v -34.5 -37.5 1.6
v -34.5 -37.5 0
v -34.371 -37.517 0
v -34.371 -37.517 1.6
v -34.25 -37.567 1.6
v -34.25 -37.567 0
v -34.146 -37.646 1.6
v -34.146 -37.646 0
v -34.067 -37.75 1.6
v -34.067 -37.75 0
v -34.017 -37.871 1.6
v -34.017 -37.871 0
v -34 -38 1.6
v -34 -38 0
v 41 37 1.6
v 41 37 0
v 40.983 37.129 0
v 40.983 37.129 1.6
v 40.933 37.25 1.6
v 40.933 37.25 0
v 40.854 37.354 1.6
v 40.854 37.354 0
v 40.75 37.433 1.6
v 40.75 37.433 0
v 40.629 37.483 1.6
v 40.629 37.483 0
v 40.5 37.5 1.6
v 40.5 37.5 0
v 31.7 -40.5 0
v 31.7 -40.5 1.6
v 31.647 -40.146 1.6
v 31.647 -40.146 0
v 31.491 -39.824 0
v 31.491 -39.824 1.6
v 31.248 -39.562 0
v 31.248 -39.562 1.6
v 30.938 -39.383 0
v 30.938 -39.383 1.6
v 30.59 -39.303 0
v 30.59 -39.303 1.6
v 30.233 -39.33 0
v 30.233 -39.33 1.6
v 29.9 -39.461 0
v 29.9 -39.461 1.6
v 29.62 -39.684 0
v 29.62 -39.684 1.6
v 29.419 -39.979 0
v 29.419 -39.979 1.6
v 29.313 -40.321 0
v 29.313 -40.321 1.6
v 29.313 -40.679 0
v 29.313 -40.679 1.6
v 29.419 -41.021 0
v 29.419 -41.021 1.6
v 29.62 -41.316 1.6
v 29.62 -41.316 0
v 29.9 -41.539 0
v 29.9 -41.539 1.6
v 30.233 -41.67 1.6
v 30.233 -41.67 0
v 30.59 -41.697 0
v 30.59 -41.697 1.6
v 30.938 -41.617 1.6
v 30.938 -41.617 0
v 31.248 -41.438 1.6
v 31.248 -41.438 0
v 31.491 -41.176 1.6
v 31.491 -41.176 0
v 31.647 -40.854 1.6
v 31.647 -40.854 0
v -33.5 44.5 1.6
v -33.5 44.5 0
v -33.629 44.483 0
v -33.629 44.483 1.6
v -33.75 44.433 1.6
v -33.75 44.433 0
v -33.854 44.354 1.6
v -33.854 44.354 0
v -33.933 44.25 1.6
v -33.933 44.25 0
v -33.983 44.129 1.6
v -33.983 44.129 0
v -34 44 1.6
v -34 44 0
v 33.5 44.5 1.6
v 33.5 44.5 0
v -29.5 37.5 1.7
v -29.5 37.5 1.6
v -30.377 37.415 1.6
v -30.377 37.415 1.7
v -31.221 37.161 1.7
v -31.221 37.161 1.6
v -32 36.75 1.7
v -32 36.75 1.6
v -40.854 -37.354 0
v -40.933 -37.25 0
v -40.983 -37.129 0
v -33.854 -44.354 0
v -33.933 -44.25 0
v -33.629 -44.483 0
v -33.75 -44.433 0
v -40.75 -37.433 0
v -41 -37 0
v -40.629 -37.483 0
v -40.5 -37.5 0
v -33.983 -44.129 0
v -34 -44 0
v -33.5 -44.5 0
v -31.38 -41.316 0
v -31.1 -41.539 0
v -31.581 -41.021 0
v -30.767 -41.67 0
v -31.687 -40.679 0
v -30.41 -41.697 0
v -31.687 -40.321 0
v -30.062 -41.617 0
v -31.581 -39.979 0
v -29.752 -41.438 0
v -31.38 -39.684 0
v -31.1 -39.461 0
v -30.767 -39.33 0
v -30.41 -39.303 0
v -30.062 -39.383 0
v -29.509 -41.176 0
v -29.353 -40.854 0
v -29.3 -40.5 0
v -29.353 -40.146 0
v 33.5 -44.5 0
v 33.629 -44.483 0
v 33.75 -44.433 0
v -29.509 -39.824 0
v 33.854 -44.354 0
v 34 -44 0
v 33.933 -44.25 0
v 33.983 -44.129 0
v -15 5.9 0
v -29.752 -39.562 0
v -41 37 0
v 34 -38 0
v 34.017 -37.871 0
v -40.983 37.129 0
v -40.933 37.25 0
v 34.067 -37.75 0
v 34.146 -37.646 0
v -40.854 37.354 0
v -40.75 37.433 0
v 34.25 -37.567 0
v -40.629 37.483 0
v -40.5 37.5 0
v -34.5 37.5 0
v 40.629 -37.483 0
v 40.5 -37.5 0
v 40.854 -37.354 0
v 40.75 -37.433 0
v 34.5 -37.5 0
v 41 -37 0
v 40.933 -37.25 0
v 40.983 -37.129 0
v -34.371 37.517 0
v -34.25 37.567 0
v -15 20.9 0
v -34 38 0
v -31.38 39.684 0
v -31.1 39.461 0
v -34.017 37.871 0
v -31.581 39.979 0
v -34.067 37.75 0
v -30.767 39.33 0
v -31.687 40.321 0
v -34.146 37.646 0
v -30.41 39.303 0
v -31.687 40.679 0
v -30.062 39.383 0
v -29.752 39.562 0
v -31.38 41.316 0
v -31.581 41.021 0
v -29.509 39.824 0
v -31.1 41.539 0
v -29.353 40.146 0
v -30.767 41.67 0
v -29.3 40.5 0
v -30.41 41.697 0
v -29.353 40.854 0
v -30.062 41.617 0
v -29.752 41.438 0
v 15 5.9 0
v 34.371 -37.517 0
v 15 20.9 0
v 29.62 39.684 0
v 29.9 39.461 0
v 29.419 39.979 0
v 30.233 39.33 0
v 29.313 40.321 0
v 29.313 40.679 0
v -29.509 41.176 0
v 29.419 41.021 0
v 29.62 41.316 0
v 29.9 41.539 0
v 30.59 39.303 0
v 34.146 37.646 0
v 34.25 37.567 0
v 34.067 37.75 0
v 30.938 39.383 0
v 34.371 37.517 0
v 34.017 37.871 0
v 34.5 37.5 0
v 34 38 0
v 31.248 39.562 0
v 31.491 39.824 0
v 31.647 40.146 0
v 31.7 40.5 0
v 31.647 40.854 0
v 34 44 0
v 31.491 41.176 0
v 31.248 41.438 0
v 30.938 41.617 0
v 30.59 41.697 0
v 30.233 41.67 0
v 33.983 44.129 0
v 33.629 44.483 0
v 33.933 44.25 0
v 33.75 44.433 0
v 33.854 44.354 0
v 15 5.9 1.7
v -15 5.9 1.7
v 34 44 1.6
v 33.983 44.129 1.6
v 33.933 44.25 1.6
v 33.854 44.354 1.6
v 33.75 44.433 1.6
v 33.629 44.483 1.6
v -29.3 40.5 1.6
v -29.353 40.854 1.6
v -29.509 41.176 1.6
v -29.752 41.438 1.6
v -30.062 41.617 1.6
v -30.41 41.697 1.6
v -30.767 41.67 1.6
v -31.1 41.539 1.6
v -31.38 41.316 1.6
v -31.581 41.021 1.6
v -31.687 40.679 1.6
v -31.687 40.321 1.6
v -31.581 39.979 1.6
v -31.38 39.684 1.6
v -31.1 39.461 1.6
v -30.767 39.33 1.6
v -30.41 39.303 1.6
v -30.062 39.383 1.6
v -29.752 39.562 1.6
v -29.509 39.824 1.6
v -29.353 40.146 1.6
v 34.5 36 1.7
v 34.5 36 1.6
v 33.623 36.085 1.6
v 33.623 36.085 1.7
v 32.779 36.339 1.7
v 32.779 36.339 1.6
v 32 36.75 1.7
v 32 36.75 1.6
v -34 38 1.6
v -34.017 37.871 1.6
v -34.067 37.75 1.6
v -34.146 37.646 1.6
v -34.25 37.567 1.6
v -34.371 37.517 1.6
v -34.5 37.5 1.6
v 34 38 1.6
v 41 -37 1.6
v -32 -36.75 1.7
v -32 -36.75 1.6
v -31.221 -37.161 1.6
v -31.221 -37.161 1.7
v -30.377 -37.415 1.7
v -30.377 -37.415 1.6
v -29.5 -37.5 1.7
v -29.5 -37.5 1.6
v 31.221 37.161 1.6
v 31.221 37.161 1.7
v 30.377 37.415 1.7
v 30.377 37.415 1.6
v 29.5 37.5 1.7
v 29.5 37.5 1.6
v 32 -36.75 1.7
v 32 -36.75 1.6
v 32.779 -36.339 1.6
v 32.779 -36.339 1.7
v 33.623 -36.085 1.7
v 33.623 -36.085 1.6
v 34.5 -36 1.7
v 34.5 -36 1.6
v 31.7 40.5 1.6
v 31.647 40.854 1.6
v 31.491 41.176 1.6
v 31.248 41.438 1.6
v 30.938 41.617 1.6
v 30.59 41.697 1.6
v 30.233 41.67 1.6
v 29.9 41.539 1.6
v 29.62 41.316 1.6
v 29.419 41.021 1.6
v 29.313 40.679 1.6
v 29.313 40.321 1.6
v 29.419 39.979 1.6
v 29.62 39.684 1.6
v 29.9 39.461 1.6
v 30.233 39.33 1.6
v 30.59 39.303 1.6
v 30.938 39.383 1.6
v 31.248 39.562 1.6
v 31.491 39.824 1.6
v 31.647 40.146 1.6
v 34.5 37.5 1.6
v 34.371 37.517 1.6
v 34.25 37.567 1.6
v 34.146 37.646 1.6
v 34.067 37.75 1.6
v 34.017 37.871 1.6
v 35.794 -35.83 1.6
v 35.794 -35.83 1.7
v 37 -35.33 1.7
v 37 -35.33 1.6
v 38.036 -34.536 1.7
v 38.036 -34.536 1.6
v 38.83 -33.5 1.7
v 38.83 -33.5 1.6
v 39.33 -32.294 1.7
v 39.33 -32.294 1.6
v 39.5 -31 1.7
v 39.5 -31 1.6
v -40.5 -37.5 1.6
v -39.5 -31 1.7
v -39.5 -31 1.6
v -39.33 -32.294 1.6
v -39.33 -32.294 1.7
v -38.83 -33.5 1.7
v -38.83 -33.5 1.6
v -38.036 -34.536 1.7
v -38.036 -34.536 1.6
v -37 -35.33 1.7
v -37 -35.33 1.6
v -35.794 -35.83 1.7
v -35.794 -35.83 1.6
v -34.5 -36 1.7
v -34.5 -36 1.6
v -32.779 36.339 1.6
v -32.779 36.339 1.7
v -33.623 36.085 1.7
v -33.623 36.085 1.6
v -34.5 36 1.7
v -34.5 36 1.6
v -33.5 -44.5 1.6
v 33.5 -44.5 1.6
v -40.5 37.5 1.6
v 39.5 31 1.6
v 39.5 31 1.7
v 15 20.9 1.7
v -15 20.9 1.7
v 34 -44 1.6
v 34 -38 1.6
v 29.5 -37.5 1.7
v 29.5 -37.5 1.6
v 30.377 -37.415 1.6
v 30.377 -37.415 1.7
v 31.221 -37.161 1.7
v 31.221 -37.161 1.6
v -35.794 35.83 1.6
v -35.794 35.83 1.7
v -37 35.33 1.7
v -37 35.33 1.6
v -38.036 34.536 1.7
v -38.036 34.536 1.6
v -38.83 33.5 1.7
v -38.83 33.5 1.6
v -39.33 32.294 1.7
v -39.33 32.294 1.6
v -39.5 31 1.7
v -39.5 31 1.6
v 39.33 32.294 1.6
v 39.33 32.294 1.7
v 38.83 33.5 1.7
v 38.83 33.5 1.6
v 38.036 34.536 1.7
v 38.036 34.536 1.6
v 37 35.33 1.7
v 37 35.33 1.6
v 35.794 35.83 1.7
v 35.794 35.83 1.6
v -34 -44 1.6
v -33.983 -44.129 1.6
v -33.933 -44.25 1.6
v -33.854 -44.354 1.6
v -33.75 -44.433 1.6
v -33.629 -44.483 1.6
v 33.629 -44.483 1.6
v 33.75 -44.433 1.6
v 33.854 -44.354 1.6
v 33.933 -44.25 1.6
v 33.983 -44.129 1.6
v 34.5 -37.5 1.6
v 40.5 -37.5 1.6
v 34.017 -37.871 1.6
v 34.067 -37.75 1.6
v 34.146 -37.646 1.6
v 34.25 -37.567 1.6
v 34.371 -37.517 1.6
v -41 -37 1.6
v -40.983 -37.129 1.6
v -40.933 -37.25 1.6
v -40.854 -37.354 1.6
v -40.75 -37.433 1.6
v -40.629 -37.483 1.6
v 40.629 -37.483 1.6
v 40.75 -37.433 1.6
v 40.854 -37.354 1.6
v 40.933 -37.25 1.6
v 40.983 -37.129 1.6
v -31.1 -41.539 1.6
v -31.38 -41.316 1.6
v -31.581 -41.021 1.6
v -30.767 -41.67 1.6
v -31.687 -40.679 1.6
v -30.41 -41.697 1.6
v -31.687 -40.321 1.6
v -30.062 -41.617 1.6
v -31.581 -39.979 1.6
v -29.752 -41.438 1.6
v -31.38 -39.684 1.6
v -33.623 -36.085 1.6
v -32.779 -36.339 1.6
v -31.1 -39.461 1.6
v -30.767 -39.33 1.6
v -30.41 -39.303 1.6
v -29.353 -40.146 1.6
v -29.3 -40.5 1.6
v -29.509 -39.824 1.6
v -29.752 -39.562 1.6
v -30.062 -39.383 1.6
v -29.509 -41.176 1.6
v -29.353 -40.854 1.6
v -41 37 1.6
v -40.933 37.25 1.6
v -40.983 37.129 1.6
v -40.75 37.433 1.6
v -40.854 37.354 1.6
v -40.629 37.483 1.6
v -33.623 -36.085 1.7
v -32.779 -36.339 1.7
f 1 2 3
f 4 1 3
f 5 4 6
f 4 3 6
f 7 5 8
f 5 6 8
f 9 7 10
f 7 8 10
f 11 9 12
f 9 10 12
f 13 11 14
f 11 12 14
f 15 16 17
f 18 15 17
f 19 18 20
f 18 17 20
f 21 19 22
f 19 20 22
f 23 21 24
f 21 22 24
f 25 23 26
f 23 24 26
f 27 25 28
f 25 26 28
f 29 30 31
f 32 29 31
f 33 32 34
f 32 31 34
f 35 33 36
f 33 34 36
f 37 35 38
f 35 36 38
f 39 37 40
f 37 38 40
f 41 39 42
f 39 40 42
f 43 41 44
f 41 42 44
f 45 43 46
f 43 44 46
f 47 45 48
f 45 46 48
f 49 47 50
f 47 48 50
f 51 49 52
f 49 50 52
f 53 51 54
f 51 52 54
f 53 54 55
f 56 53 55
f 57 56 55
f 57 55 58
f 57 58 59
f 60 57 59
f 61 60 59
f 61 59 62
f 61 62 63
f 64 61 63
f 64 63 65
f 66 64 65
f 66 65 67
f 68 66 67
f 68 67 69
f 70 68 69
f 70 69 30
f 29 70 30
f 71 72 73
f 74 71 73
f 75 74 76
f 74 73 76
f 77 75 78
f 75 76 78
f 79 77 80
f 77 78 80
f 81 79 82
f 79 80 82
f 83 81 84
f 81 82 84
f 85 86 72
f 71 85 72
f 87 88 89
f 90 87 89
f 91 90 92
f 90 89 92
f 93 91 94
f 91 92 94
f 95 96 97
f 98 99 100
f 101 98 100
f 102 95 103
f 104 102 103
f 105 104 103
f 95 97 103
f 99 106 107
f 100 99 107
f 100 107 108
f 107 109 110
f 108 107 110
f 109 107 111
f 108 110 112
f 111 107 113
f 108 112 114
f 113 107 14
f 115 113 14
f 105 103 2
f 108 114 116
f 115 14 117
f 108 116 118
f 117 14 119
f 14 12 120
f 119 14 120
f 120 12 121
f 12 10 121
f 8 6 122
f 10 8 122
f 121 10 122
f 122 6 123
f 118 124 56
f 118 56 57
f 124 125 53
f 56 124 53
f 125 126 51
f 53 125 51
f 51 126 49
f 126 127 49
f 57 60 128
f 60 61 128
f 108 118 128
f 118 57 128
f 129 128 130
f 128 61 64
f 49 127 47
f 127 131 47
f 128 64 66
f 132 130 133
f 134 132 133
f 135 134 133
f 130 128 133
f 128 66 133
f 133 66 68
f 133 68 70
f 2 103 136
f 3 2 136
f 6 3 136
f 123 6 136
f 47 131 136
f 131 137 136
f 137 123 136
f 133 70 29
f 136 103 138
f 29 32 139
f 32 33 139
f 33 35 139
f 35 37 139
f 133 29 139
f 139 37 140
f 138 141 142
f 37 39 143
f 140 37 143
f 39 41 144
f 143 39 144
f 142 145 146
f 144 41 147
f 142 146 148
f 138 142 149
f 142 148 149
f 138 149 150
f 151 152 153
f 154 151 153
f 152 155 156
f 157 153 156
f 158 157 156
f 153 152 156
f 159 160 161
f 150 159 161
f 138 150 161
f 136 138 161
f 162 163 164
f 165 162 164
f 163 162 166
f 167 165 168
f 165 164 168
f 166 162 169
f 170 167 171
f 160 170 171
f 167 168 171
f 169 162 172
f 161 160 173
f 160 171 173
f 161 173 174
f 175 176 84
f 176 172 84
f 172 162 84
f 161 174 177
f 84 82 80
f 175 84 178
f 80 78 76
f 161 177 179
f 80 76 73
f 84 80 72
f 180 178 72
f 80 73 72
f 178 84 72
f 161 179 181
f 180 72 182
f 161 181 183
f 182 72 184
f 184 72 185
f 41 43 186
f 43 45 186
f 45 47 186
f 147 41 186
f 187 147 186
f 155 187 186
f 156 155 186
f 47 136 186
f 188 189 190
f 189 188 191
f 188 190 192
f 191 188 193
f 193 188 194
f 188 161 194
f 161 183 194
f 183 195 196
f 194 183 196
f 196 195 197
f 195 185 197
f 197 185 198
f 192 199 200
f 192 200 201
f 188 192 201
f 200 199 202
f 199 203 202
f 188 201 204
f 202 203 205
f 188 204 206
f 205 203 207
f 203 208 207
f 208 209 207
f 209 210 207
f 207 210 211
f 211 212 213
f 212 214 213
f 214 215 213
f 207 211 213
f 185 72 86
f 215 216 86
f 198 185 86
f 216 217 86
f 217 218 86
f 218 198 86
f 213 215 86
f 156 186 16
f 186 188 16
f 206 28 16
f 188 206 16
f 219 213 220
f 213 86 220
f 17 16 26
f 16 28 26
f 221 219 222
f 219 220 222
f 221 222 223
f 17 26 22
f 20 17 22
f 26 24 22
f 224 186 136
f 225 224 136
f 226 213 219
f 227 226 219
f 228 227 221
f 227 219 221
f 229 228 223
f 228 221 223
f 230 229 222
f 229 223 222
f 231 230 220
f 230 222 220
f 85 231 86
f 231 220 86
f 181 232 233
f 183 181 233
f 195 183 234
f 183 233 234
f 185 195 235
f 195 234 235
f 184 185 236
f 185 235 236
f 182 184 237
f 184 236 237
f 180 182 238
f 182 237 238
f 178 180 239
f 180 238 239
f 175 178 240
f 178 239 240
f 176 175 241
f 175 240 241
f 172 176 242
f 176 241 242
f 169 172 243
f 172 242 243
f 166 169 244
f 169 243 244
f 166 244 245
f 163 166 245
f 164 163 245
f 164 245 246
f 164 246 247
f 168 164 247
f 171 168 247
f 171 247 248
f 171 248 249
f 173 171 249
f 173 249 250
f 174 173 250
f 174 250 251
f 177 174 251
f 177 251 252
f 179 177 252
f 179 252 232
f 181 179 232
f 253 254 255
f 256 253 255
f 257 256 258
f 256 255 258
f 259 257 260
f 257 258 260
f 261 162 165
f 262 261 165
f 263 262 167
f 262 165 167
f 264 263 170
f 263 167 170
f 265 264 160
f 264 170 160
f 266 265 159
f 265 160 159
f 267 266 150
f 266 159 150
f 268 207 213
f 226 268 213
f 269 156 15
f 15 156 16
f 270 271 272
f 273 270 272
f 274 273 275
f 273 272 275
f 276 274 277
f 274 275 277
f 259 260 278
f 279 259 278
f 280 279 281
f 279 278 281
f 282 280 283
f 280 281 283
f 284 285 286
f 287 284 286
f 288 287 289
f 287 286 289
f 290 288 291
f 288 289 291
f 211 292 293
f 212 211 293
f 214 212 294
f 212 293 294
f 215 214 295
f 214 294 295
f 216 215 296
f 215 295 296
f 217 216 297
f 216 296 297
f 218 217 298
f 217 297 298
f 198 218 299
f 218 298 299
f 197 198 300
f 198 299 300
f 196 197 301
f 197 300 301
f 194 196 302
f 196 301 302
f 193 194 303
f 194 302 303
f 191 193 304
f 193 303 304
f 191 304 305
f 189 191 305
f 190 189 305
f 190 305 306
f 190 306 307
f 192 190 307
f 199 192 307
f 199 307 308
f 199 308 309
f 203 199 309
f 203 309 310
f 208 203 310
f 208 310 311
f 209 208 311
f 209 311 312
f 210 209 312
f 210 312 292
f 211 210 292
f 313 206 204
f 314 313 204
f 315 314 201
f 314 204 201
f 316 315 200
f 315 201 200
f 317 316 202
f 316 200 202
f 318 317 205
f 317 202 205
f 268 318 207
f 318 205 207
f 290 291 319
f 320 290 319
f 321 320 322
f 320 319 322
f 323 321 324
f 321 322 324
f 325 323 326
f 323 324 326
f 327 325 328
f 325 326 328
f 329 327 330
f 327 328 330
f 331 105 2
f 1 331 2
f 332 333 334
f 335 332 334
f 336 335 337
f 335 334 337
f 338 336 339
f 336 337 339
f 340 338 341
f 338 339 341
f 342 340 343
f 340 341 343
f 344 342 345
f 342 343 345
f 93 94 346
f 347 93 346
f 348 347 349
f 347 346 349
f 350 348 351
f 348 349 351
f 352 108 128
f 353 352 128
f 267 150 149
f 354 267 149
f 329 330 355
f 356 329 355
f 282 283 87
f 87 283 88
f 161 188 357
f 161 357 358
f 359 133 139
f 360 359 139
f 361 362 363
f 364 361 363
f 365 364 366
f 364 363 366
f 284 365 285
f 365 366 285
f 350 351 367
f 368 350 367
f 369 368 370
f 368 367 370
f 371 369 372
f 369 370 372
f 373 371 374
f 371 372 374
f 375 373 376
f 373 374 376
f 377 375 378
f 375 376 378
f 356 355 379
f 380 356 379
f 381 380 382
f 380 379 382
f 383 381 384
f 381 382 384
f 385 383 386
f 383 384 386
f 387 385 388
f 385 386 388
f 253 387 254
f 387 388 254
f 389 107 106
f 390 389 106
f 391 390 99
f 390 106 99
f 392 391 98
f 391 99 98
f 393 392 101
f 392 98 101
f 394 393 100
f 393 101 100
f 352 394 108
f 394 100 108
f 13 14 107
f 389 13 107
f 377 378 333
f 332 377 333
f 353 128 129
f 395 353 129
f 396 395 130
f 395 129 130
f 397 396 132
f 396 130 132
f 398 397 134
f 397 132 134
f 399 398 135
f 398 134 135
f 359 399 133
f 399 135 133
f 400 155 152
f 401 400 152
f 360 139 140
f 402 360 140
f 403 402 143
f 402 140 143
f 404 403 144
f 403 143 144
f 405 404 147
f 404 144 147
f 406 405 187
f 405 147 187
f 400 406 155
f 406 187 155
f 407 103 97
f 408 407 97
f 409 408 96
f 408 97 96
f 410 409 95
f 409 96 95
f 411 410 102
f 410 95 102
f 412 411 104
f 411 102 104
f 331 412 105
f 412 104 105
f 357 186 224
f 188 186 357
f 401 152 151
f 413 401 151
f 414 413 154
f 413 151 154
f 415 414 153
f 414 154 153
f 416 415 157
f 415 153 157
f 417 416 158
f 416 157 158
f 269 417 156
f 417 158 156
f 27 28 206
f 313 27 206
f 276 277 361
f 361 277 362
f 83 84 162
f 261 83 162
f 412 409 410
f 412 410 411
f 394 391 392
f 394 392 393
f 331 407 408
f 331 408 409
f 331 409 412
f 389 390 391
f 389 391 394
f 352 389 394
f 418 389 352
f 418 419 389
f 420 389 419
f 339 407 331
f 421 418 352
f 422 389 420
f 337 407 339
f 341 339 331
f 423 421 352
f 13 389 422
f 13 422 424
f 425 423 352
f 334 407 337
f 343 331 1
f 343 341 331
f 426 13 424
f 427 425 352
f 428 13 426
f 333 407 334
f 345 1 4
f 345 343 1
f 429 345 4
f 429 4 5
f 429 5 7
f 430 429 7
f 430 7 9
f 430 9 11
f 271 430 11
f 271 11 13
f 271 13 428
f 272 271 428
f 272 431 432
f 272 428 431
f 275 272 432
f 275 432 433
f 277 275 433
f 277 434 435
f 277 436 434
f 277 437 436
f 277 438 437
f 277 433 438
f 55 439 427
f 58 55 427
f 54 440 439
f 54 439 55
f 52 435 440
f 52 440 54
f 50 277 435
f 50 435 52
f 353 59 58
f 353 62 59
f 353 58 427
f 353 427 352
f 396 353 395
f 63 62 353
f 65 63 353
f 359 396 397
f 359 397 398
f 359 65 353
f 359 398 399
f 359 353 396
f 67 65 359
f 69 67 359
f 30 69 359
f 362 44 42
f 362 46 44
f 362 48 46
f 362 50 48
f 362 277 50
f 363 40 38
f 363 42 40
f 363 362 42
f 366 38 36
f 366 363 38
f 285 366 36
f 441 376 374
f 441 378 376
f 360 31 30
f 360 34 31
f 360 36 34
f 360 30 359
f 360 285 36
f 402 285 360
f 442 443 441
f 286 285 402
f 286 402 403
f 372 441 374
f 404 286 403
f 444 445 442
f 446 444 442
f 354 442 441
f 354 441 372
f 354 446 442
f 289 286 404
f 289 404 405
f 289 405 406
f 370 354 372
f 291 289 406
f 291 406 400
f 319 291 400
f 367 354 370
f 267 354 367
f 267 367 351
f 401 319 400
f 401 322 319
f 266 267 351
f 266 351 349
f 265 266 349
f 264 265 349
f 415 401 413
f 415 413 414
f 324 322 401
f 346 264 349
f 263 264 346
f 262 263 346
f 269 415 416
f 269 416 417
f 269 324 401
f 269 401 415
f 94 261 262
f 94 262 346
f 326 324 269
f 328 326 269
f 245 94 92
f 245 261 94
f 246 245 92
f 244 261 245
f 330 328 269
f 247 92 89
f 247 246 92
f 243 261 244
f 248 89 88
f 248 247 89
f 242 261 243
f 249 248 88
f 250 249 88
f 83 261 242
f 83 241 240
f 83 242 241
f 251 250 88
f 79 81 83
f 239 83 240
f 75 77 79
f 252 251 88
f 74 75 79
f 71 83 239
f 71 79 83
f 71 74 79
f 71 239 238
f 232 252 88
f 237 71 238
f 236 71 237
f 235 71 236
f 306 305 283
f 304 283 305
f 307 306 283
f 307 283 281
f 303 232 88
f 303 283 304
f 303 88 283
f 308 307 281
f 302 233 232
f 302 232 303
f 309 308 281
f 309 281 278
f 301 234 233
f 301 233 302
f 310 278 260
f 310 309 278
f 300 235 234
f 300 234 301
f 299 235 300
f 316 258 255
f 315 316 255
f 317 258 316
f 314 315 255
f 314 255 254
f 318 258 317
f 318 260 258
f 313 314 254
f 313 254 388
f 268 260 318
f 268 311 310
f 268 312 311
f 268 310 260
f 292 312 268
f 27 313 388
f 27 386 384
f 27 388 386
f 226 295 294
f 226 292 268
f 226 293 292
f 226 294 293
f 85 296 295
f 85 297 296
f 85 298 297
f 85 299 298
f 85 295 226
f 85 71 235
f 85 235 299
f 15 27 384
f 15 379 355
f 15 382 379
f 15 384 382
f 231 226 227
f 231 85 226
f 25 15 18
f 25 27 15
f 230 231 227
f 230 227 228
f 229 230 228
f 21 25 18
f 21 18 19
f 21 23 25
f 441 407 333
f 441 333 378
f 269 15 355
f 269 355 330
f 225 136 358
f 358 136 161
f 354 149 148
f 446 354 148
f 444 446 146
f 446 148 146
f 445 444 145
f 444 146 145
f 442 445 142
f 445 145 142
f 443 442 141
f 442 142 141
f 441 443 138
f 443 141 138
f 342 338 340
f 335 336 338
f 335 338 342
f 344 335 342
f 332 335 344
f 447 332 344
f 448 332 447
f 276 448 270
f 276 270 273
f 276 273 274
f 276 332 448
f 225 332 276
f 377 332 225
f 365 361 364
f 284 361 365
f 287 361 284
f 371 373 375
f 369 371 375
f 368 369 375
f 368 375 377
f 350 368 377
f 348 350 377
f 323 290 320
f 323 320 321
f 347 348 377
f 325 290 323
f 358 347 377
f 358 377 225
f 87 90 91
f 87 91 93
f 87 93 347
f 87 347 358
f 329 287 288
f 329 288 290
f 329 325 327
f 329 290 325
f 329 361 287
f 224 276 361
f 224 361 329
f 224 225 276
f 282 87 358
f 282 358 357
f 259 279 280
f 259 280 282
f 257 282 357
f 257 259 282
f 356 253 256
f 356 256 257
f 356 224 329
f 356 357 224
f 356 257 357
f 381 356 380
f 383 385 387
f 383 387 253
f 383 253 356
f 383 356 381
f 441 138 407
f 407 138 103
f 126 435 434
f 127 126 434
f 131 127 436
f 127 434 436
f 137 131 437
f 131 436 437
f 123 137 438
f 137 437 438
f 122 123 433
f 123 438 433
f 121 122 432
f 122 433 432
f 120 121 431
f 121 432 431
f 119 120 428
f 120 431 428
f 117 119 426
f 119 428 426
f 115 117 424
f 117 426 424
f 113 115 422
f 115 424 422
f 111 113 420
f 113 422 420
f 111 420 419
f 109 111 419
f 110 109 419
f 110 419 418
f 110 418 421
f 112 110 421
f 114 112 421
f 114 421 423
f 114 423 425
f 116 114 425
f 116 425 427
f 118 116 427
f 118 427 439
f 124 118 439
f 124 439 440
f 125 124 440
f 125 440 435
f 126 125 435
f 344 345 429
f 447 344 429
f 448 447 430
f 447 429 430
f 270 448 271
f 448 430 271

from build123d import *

# Parameters (mm, degrees)
BOSS_EXTRUDE1_DEPTH            = 1.6
BOSS_EXTRUDE2_DEPTH            = 0.1
M2_HOLE1_FIXINGSTRUCTURE_D     = 2.4
M2_HOLE1_FIXINGSTRUCTURE_DEPTH = 200
M2_HOLE1_FIXINGSTRUCTURE_TIP   = 0.721032743
SKETCH4_W                      = 30
SKETCH4_H                      = 15
CUT_EXTRUDE1_DEPTH             = 1.7


with BuildPart() as part:
    # Sketch1 → Boss-Extrude1 (new body)
    with BuildSketch(Plane.XY):
        with BuildLine():
            Line((-34, 44), (-34, 38))
            ThreePointArc((-34, 38), (-34.146446609, 37.646446609), (-34.5, 37.5))
            Line((-34.5, 37.5), (-40.5, 37.5))
            ThreePointArc((-40.5, 37.5), (-40.853553391, 37.353553391), (-41, 37))
            Line((-41, 37), (-41, -37))
            ThreePointArc((-41, -37), (-40.853553391, -37.353553391), (-40.5, -37.5))
            Line((-40.5, -37.5), (-34.5, -37.5))
            ThreePointArc((-34.5, -37.5), (-34.146446609, -37.646446609), (-34, -38))
            Line((-34, -38), (-34, -44))
            ThreePointArc((-34, -44), (-33.853553391, -44.353553391), (-33.5, -44.5))
            Line((-33.5, -44.5), (33.5, -44.5))
            ThreePointArc((33.5, -44.5), (33.853553391, -44.353553391), (34, -44))
            Line((34, -44), (34, -38))
            ThreePointArc((34, -38), (34.146446609, -37.646446609), (34.5, -37.5))
            Line((34.5, -37.5), (40.5, -37.5))
            ThreePointArc((40.5, -37.5), (40.853553391, -37.353553391), (41, -37))
            Line((41, -37), (41, 37))
            ThreePointArc((41, 37), (40.853553391, 37.353553391), (40.5, 37.5))
            Line((40.5, 37.5), (34.5, 37.5))
            ThreePointArc((34.5, 37.5), (34.146446609, 37.646446609), (34, 38))
            Line((34, 38), (34, 44))
            ThreePointArc((34, 44), (33.853553391, 44.353553391), (33.5, 44.5))
            Line((33.5, 44.5), (-33.5, 44.5))
            ThreePointArc((-33.5, 44.5), (-33.853553391, 44.353553391), (-34, 44))
        make_face()
    extrude(amount=BOSS_EXTRUDE1_DEPTH)

    # Esboço1 → Boss-Extrude2 (add)
    with BuildSketch(Plane.XY.offset(1.6)):
        with BuildLine():
            Line((-29.5, -37.5), (29.5, -37.5))
            ThreePointArc((29.5, -37.5), (30.805038314, -37.308461045), (32, -36.75))
            ThreePointArc((32, -36.75), (33.194961686, -36.191538955), (34.5, -36))
            ThreePointArc((34.5, -36), (38.035533906, -34.535533906), (39.5, -31))
            Line((39.5, -31), (39.5, 31))
            ThreePointArc((39.5, 31), (38.035533906, 34.535533906), (34.5, 36))
            ThreePointArc((34.5, 36), (33.194961686, 36.191538955), (32, 36.75))
            ThreePointArc((32, 36.75), (30.805038314, 37.308461045), (29.5, 37.5))
            Line((29.5, 37.5), (-29.5, 37.5))
            ThreePointArc((-29.5, 37.5), (-30.805038314, 37.308461045), (-32, 36.75))
            ThreePointArc((-32, 36.75), (-33.194961686, 36.191538955), (-34.5, 36))
            ThreePointArc((-34.5, 36), (-38.035533906, 34.535533906), (-39.5, 31))
            Line((-39.5, 31), (-39.5, -31))
            ThreePointArc((-39.5, -31), (-38.035533906, -34.535533906), (-34.5, -36))
            ThreePointArc((-34.5, -36), (-33.194961686, -36.191538955), (-32, -36.75))
            ThreePointArc((-32, -36.75), (-30.805038314, -37.308461045), (-29.5, -37.5))
        make_face()
    extrude(amount=BOSS_EXTRUDE2_DEPTH)

    # M2 Hole1-FixingStructure
    with Locations(Plane(origin=(0, 0, 0), x_dir=(-1, 0, 0), z_dir=(0, 0, -1))):
        with Locations((-30.5, 40.5), (30.5, 40.5), (-30.5, -40.5), (30.5, -40.5)):
            Hole(M2_HOLE1_FIXINGSTRUCTURE_D / 2, depth=M2_HOLE1_FIXINGSTRUCTURE_DEPTH)
            with Locations((0, 0, -(M2_HOLE1_FIXINGSTRUCTURE_DEPTH + M2_HOLE1_FIXINGSTRUCTURE_TIP / 2))):  # 118° drill point
                Cone(0, M2_HOLE1_FIXINGSTRUCTURE_D / 2, M2_HOLE1_FIXINGSTRUCTURE_TIP, mode=Mode.SUBTRACT)

    # Sketch4 → Cut-Extrude1 (cut)
    with BuildSketch(Plane(origin=(0, 0, 0), x_dir=(-1, 0, 0), z_dir=(0, 0, -1))):
        with Locations((0, 13.4)):
            Rectangle(SKETCH4_W, SKETCH4_H)
    extrude(amount=-CUT_EXTRUDE1_DEPTH, mode=Mode.SUBTRACT)


solid = part.part
